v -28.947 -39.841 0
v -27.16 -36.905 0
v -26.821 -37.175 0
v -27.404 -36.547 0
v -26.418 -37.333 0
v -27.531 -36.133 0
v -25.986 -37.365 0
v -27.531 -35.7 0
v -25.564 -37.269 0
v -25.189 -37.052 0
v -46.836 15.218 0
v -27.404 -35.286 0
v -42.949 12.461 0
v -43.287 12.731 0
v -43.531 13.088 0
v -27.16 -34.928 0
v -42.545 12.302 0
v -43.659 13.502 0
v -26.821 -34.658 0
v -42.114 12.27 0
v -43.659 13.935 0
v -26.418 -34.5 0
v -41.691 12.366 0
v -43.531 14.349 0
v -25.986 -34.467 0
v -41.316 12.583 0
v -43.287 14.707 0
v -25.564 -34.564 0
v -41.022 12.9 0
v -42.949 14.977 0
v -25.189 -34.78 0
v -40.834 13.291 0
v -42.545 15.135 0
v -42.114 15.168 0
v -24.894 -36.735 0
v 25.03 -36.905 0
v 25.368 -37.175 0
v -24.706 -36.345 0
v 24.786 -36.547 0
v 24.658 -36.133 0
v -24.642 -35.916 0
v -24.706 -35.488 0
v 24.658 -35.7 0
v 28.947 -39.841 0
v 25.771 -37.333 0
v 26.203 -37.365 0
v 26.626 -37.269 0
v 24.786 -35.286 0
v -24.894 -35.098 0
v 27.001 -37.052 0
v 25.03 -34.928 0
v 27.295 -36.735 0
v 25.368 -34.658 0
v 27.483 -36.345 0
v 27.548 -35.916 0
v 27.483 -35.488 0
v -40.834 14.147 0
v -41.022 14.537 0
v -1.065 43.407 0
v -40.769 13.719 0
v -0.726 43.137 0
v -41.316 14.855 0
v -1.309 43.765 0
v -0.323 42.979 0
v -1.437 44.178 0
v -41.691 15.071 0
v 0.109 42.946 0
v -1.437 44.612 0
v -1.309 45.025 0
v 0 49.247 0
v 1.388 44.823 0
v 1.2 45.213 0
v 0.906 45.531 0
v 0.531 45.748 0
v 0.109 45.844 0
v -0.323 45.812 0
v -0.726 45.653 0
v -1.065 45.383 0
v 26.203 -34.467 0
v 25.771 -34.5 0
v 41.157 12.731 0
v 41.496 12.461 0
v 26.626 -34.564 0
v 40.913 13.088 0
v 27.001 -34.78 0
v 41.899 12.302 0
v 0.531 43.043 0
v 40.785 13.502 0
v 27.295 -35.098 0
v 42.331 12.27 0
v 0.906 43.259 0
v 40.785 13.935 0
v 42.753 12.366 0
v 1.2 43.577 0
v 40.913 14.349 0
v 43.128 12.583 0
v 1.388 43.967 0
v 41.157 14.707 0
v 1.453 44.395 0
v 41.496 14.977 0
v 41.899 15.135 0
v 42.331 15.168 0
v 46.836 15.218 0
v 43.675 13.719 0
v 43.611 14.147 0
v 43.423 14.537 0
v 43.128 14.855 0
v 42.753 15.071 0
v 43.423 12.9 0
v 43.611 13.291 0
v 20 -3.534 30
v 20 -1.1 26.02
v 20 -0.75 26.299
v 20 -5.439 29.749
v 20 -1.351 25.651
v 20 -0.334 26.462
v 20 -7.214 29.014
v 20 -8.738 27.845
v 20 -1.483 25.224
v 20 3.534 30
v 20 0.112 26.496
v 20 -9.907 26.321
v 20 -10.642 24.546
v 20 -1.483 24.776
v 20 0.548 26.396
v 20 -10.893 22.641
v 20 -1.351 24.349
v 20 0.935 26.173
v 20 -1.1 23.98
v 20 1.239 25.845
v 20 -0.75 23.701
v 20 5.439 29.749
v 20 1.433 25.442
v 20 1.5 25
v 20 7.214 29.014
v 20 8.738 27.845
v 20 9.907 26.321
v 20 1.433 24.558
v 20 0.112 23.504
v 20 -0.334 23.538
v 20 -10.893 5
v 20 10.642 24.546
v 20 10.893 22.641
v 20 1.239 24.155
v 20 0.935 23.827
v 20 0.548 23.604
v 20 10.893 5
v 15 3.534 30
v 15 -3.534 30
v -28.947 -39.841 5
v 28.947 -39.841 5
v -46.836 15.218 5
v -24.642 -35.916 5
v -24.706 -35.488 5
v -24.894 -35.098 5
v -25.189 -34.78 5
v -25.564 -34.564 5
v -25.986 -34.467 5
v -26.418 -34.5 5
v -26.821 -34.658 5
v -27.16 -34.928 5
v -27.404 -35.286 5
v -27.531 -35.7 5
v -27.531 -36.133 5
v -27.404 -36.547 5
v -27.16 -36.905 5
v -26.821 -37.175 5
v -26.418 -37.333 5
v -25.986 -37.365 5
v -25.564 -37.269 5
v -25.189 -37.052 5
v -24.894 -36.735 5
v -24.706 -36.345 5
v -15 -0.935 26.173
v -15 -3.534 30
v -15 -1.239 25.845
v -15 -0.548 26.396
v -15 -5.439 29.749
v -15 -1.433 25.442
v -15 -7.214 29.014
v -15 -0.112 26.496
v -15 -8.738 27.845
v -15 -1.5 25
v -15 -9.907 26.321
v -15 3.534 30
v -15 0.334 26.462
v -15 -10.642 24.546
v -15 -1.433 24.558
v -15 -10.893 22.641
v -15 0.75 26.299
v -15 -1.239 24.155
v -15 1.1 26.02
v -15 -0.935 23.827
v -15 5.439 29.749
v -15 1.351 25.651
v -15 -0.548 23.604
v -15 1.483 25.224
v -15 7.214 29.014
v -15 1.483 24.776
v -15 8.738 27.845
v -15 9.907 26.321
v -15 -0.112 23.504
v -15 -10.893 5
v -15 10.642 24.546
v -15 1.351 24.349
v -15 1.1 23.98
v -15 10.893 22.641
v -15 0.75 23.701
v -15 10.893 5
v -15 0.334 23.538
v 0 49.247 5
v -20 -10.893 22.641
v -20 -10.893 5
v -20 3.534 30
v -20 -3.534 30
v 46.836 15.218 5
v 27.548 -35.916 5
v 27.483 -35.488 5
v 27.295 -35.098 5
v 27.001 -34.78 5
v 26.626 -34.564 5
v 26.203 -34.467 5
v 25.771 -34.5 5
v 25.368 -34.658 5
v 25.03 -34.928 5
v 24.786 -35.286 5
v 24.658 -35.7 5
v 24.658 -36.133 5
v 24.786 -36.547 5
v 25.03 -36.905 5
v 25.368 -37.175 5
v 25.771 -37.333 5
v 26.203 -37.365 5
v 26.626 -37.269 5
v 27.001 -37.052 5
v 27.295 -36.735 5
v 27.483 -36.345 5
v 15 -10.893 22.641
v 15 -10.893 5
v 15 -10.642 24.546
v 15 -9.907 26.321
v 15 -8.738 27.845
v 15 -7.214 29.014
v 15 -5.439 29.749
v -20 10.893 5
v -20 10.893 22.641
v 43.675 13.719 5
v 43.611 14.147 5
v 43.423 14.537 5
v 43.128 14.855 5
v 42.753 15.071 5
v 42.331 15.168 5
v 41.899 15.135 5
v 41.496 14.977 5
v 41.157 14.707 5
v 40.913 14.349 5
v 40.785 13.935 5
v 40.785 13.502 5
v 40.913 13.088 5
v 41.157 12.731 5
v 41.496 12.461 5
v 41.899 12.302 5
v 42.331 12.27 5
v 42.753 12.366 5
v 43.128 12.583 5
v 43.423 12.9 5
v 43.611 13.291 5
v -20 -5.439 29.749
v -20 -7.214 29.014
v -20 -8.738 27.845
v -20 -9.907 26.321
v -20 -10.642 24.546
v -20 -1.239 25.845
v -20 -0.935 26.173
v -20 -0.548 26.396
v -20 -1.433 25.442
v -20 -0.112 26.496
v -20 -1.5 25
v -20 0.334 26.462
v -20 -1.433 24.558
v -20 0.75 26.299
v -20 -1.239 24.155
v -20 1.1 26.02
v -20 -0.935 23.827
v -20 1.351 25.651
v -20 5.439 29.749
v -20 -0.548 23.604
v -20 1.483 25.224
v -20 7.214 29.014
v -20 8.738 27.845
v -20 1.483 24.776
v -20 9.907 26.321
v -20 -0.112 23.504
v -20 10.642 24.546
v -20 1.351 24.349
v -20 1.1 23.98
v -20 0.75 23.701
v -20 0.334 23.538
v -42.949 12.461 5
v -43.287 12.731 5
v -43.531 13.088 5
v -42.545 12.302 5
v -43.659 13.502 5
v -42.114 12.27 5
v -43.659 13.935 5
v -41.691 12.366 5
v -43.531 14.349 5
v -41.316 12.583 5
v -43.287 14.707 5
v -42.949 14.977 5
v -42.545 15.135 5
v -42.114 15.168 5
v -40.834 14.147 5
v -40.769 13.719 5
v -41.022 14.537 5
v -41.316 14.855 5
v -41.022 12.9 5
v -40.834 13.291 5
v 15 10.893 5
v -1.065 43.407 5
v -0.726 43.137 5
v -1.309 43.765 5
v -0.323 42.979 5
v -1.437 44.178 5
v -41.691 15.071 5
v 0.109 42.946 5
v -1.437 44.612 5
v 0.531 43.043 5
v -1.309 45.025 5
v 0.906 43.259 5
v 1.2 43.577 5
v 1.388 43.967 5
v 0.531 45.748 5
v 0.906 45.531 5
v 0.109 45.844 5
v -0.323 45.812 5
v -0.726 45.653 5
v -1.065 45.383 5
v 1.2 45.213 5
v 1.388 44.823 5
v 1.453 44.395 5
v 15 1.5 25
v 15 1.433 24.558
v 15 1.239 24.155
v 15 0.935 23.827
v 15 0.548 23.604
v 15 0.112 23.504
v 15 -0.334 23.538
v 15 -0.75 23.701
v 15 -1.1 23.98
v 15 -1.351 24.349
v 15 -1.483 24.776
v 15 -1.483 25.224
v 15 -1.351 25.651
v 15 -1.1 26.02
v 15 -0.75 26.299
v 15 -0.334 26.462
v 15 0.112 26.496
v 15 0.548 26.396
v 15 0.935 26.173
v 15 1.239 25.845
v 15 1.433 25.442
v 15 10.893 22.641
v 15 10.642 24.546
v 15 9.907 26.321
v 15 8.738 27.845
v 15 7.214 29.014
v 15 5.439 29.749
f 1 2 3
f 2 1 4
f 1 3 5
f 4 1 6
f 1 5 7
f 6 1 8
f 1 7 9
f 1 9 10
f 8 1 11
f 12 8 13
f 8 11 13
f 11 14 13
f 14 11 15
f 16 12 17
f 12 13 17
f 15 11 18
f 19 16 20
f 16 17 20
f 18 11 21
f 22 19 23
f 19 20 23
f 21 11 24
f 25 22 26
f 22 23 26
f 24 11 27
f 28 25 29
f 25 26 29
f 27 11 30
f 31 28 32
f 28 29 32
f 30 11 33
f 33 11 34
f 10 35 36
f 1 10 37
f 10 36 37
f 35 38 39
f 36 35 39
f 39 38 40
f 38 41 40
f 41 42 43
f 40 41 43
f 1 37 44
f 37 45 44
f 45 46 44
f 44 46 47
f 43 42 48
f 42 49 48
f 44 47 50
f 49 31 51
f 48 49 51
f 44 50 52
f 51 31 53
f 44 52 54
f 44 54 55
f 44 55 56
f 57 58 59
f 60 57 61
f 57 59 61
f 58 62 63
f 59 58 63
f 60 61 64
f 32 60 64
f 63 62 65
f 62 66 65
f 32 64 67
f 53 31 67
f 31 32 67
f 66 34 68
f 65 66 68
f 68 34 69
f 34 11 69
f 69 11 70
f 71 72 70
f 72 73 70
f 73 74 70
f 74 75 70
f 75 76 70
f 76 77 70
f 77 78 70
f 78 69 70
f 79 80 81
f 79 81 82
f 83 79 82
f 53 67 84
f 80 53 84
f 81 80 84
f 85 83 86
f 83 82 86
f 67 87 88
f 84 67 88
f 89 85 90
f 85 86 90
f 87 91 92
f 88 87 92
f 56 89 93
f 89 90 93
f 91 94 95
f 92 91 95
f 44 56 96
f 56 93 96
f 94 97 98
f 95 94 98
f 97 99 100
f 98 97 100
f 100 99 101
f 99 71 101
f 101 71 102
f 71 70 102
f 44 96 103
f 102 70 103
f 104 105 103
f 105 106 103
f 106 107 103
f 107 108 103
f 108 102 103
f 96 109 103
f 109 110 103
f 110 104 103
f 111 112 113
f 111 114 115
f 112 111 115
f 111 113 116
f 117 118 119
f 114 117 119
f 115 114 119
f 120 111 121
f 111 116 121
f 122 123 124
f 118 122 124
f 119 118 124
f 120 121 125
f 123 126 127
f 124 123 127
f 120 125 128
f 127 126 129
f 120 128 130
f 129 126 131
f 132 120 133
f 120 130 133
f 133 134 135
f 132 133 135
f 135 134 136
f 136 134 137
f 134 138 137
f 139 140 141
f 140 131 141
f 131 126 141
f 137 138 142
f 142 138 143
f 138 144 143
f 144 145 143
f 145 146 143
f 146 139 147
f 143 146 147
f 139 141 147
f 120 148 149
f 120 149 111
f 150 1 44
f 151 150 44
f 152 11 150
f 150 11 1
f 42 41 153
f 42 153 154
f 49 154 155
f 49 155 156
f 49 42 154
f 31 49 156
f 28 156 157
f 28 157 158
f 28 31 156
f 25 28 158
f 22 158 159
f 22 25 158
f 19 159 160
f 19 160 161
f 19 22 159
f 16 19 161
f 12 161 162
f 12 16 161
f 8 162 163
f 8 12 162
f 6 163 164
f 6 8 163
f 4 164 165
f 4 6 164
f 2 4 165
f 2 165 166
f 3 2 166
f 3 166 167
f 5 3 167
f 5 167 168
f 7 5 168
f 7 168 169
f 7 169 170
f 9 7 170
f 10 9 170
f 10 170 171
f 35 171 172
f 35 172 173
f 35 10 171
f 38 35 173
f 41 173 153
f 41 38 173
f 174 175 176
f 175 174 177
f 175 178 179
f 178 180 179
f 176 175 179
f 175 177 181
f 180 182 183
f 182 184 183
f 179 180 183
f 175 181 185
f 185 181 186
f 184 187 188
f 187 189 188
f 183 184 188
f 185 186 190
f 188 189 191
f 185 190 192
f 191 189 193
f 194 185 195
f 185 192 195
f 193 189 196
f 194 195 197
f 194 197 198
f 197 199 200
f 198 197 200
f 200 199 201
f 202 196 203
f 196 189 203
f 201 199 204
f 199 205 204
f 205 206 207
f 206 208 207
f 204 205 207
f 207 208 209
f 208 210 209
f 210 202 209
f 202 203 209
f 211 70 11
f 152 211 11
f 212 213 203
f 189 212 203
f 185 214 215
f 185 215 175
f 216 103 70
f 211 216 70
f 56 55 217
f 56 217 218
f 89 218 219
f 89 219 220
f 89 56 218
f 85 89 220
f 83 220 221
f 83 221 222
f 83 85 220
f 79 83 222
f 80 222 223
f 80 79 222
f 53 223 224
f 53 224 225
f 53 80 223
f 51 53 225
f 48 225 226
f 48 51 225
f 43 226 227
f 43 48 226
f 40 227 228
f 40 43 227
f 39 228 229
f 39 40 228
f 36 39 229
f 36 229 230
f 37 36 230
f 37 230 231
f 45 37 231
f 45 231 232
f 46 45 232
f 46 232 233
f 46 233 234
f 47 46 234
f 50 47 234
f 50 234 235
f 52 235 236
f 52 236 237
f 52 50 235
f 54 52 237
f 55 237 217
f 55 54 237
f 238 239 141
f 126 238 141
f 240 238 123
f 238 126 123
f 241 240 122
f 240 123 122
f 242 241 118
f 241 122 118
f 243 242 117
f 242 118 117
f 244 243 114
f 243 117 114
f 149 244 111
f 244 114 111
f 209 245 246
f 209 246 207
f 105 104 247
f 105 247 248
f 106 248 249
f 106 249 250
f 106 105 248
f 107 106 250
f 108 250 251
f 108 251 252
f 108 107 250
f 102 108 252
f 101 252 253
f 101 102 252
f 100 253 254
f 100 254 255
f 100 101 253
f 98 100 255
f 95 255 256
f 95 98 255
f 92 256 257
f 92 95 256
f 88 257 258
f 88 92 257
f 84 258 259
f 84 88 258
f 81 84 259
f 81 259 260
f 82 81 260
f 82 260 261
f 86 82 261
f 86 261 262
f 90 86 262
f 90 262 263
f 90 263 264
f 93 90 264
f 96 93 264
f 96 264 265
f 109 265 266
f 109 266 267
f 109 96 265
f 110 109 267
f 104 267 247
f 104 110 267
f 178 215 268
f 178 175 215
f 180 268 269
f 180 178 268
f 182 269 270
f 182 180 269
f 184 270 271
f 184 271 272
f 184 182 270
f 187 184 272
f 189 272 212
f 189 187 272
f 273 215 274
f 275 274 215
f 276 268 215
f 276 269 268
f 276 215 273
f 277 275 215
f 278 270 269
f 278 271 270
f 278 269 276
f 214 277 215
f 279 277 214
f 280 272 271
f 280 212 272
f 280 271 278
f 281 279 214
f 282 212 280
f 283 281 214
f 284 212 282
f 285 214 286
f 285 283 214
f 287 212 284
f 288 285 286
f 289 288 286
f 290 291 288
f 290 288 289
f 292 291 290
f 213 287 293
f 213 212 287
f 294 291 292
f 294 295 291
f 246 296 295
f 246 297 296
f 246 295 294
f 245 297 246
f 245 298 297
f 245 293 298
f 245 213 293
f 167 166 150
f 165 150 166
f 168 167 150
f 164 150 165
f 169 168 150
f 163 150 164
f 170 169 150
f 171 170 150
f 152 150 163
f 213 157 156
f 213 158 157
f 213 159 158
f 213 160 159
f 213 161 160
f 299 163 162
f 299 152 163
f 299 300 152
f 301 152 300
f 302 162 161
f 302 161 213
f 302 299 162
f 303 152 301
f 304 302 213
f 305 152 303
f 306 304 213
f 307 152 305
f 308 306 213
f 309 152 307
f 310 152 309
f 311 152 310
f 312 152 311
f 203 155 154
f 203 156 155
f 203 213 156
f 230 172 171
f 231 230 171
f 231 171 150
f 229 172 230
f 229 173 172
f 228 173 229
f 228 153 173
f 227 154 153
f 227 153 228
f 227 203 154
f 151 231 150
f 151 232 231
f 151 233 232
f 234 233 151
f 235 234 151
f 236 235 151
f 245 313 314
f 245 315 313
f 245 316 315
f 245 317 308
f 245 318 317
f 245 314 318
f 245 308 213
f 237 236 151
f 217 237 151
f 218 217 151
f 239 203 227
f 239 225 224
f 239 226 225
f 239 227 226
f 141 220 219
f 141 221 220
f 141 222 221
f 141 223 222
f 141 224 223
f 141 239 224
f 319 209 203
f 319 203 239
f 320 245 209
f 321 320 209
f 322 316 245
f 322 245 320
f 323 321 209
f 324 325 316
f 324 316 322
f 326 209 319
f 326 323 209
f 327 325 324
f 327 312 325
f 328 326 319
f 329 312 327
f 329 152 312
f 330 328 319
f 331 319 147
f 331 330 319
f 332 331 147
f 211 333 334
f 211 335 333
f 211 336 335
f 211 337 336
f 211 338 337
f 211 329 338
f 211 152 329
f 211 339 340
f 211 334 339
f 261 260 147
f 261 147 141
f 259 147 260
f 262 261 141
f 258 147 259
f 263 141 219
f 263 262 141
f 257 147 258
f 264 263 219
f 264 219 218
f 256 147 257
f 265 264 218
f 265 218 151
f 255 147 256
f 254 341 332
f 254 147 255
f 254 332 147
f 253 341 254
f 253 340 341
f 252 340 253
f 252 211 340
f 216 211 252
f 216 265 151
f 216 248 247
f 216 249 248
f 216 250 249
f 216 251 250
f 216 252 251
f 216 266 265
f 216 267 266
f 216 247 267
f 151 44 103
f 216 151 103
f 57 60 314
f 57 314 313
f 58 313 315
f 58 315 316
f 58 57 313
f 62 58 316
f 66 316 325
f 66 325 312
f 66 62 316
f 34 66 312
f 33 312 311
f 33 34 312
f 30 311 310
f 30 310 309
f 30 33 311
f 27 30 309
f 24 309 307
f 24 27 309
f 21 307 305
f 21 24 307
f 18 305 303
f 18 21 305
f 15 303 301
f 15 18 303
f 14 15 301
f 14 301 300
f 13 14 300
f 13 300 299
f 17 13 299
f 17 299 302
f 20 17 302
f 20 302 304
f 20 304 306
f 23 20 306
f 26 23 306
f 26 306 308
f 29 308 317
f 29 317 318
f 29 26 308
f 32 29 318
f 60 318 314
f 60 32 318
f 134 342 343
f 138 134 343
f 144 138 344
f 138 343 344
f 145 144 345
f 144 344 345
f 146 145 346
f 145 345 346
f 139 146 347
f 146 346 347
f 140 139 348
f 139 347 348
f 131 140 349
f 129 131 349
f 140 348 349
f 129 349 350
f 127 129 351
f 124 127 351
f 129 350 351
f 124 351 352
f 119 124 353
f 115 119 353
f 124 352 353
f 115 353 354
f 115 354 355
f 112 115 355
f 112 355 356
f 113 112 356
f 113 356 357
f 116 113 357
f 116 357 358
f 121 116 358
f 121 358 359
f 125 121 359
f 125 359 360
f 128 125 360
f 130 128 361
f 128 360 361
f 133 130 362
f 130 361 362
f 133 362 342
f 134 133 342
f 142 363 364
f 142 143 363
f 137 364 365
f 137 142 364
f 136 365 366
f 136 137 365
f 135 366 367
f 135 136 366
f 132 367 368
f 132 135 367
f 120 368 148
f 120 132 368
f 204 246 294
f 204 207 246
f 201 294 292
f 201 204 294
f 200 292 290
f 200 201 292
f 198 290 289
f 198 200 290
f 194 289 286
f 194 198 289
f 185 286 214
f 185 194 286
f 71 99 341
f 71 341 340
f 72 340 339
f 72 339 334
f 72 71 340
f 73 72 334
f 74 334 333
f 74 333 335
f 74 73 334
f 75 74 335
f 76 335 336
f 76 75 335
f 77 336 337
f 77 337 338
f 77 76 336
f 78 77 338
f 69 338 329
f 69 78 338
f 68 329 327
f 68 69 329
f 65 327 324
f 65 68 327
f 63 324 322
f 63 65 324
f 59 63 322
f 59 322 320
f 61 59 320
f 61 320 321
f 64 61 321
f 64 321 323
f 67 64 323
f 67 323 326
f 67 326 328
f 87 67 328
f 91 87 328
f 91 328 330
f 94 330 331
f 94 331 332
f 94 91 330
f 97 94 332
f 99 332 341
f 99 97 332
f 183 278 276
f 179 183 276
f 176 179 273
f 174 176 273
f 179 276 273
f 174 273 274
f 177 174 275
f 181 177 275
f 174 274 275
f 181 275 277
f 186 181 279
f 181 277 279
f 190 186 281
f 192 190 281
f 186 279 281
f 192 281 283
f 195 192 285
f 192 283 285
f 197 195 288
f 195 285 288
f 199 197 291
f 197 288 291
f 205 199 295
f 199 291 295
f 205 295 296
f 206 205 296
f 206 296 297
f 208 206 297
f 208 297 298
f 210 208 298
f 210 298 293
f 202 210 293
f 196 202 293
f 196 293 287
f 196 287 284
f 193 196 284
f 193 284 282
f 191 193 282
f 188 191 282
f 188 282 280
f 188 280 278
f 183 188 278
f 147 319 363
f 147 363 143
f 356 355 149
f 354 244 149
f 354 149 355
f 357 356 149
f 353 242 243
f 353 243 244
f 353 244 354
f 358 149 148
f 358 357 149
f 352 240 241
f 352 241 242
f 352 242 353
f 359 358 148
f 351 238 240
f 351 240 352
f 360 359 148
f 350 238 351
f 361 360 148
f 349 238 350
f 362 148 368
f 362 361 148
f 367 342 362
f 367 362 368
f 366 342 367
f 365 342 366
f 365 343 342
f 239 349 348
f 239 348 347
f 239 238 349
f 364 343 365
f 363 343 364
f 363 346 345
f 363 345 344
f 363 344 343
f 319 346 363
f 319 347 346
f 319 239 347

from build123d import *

# Parameters (mm, degrees)
F0_R     = 1.4529433878
F0_W     = 5
F0_H     = 21.7857151878
F1_DEPTH = 5
F2_DEPTH = 30
F3_R     = 7.3585229381
F5_D     = 3
F5_DEPTH = 100
F5_TIP   = 0.9012909285
F6_D     = 3
F6_DEPTH = 100
F6_START = 15
F6_TIP   = 0.9012909285


with BuildPart() as f1:
    # F0 (on Top) → F1 (new body)
    with BuildSketch(Plane.XY):
        Polygon((46.8364858899, 15.218096768), (0, 49.2467956293), (-46.8364858899, 15.218096768), (-28.9465401936, -39.8414945826), (28.9465401936, -39.8414945826), align=None)
        with Locations((-26.0947393151, -35.9163274127)):
            Circle(F0_R, mode=Mode.SUBTRACT)
        with Locations((-17.5, 0)):
            Rectangle(F0_W, F0_H, mode=Mode.SUBTRACT)
        with Locations((26.0947393151, -35.9163274127)):
            Circle(F0_R, mode=Mode.SUBTRACT)
        with Locations((17.5, 0)):
            Rectangle(F0_W, F0_H, mode=Mode.SUBTRACT)
        with Locations((-42.2221751394, 13.7188163206)):
            Circle(F0_R, mode=Mode.SUBTRACT)
        with Locations((42.2221751394, 13.7188163206)):
            Circle(F0_R, mode=Mode.SUBTRACT)
        with Locations((0, 44.3950221842)):
            Circle(F0_R, mode=Mode.SUBTRACT)
    extrude(amount=F1_DEPTH)

    # F0 (on Top) → F2 (join)
    with BuildSketch(Plane.XY):
        with Locations((-17.5, 0)):
            Rectangle(F0_W, F0_H)
        with Locations((17.5, 0)):
            Rectangle(F0_W, F0_H)
    extrude(amount=F2_DEPTH)

    # F3
    f3_edges = [f1.edges().sort_by_distance(p)[0] for p in [
        (-17.5, -10.892858, 30),
        (17.5, -10.892858, 30),
        (17.5, 10.892858, 30),
        (-17.5, 10.892858, 30),
    ]]
    fillet(f3_edges, radius=F3_R)

    # F5 (one way)
    with BuildSketch(Plane(origin=(0, 0, 0), x_dir=(0, 1, 0), z_dir=(-1, 0, 0))):
        with Locations((0, -25)):
            Circle(F5_D / 2)
    extrude(amount=-F5_DEPTH, mode=Mode.SUBTRACT)
    with Locations(Plane(origin=(0, 0, 0), x_dir=(0, 1, 0), z_dir=(-1, 0, 0))):
        with Locations((0, -25)):
            with Locations((0, 0, -(F5_DEPTH + F5_TIP / 2))):  # 118° drill point
                Cone(0, F5_D / 2, F5_TIP, mode=Mode.SUBTRACT)

    # F6
    # its depths count from where the whole tool has entered the part; down to there all is cleared
    with Locations(Plane.YZ.offset(-F6_START)):
        with Locations((0, 25)):
            Hole(F6_D / 2, depth=F6_DEPTH)
            with Locations((0, 0, -(F6_DEPTH + F6_TIP / 2))):  # 118° drill point
                Cone(0, F6_D / 2, F6_TIP, mode=Mode.SUBTRACT)


solid = f1.part
